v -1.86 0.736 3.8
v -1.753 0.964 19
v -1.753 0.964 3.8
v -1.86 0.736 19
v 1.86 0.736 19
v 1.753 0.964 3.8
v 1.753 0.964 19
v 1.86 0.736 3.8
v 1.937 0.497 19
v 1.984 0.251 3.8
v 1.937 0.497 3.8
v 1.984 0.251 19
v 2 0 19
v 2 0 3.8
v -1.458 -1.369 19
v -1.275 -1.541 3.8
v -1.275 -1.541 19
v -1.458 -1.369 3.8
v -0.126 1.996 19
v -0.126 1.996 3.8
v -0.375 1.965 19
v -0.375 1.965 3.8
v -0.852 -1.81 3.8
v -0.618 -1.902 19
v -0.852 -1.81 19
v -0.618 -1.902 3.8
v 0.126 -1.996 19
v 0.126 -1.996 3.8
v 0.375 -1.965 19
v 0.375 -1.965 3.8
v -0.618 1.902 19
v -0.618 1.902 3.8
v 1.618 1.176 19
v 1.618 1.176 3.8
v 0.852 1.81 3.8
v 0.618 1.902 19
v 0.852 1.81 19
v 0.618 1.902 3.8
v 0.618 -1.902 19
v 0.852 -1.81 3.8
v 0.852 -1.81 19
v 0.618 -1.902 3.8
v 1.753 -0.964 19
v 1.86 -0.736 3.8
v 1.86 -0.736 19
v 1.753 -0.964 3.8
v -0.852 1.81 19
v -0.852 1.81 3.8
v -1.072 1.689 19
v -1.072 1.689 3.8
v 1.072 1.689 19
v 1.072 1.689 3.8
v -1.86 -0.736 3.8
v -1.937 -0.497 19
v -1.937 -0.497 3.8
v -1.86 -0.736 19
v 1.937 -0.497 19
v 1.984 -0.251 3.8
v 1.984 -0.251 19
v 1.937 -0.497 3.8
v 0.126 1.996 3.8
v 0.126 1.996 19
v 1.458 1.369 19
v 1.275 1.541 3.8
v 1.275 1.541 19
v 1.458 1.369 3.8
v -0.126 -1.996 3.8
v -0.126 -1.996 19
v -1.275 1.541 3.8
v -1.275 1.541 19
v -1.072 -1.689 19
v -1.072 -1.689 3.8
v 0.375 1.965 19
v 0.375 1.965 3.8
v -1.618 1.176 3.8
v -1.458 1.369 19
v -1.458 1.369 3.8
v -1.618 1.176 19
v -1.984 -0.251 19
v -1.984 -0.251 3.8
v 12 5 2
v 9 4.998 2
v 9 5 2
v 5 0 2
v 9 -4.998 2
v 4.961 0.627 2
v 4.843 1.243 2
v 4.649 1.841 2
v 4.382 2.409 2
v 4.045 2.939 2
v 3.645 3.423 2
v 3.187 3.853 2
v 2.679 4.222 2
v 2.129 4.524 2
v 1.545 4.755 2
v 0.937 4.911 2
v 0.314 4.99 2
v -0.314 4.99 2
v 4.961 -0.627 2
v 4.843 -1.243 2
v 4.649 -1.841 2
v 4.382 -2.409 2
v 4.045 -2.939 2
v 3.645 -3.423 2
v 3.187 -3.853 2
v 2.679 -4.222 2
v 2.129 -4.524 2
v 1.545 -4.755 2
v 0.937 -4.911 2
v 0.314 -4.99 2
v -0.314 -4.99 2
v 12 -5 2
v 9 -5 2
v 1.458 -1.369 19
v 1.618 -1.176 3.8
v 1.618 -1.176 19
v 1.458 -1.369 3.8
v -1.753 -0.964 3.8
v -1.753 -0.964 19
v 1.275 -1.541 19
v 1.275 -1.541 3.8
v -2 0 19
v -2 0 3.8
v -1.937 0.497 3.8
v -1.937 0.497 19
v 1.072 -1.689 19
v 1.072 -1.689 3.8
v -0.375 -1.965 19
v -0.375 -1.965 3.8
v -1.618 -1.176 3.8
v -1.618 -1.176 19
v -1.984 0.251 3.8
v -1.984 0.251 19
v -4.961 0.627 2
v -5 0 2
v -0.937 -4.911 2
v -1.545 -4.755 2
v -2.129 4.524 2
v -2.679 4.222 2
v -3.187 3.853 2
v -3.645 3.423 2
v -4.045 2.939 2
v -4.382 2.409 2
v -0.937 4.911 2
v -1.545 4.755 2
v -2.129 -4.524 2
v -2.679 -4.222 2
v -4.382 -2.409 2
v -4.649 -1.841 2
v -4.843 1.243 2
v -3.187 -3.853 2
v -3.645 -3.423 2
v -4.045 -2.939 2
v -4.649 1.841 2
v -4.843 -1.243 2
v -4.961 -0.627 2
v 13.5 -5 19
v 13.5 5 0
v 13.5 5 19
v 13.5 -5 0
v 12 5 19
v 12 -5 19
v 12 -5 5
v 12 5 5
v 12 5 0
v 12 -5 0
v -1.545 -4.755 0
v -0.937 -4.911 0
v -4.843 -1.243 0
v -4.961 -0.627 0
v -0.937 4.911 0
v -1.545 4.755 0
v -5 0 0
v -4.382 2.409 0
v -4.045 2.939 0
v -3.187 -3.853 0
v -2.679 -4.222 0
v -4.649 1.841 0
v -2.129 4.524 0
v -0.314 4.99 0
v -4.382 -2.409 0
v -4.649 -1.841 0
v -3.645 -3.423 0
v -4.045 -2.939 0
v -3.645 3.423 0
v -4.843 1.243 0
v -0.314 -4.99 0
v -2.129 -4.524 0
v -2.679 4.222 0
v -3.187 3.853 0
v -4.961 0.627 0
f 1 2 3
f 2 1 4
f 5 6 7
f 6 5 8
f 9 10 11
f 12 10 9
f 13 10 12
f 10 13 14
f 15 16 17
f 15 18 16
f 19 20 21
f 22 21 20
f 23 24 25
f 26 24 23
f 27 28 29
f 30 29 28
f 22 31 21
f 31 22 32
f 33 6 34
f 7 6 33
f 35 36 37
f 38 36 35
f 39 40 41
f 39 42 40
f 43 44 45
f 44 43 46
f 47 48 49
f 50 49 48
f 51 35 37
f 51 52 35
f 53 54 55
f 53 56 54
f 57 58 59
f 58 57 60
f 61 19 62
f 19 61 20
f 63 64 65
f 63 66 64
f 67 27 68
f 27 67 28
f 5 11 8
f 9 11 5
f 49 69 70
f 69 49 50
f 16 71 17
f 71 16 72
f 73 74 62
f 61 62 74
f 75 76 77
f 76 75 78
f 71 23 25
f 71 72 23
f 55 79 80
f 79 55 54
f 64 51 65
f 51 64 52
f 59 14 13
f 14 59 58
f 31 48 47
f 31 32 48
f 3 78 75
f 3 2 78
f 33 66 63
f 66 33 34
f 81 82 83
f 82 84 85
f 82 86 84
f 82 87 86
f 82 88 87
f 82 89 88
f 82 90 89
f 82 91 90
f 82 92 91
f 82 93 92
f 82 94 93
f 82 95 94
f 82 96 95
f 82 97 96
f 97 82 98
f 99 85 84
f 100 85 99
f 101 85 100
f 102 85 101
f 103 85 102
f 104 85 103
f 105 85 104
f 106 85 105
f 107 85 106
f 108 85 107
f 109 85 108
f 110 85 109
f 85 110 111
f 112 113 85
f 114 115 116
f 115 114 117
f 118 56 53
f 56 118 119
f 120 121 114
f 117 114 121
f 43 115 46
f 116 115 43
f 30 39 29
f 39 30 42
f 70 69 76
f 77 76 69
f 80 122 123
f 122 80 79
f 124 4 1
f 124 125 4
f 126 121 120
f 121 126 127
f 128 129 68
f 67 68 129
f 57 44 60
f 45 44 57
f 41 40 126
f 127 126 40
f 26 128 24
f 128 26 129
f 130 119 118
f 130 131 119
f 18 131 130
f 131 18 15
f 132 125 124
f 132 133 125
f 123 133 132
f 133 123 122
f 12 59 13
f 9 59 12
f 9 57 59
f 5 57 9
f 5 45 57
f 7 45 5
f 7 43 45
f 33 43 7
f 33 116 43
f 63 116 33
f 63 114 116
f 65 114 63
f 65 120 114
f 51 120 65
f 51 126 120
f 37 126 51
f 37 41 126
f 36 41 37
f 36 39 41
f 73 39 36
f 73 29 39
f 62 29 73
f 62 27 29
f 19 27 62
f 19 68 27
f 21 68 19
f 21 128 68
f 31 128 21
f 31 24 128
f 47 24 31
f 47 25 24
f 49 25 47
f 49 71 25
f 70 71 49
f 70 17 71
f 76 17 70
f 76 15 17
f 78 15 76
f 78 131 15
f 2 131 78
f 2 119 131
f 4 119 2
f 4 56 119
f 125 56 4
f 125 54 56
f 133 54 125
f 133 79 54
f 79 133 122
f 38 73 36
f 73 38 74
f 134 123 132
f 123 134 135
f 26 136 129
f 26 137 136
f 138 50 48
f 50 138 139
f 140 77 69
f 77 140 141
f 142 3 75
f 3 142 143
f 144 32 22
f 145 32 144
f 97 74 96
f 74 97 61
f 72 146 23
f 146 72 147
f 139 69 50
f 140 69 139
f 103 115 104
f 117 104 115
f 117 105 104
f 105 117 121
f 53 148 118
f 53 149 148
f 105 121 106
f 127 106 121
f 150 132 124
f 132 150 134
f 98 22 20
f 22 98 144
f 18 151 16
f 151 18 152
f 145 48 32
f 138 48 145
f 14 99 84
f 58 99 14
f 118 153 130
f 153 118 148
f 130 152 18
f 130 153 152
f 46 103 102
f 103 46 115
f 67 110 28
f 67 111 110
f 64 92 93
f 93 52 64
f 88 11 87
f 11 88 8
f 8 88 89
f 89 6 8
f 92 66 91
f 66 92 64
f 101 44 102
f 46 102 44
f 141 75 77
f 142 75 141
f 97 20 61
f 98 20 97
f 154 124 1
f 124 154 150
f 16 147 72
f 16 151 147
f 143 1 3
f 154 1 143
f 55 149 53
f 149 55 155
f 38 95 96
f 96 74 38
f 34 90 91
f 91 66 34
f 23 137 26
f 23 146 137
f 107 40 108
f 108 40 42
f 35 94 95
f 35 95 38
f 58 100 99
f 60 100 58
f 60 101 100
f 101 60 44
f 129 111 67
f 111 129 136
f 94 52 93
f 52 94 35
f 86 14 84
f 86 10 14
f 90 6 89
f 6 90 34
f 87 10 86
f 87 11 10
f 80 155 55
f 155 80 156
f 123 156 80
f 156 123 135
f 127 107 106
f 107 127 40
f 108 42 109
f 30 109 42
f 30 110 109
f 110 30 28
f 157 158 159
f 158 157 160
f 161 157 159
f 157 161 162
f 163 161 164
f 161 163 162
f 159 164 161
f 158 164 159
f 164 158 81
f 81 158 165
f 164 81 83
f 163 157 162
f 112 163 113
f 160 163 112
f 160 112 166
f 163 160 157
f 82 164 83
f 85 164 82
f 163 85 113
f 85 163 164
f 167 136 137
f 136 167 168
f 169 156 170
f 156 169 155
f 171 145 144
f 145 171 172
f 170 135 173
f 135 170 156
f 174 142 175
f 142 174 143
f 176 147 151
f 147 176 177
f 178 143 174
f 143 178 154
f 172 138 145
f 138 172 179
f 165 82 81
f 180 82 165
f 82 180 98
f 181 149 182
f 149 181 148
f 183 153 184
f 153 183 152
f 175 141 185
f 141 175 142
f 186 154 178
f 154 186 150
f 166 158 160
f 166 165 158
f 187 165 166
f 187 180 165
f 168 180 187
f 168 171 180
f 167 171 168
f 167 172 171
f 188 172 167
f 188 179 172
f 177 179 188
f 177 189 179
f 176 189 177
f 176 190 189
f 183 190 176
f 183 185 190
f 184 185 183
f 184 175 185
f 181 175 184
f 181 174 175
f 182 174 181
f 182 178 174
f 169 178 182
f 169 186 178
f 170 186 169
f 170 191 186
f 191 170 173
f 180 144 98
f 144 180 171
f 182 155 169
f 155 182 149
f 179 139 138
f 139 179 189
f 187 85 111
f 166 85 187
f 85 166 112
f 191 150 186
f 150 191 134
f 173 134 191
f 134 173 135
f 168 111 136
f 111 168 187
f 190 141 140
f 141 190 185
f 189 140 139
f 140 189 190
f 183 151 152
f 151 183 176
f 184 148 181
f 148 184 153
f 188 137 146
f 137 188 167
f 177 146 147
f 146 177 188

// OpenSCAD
$fn = 50;

translate([0, 0, 2]) {
  cylinder(r = 2, h = 17);
  rotate_extrude() right_triangle(base = 5, height = 3);

  translate([12, -5]) cube([1.5, 10, 17]);
  translate([12, 5]) rotate([90, 270])
    linear_extrude(height = 10) right_triangle(base = 3, height = 3);
}

linear_extrude(height = 2) hull() {
  circle(r = 5);
  translate([12, -5]) square([1.5, 10]);
}

module right_triangle(base, height) polygon(
  points = [ [ 0, 0 ], [ base, 0 ], [ 0, height ] ],
  paths = [[ 0, 1, 2 ]]
);
